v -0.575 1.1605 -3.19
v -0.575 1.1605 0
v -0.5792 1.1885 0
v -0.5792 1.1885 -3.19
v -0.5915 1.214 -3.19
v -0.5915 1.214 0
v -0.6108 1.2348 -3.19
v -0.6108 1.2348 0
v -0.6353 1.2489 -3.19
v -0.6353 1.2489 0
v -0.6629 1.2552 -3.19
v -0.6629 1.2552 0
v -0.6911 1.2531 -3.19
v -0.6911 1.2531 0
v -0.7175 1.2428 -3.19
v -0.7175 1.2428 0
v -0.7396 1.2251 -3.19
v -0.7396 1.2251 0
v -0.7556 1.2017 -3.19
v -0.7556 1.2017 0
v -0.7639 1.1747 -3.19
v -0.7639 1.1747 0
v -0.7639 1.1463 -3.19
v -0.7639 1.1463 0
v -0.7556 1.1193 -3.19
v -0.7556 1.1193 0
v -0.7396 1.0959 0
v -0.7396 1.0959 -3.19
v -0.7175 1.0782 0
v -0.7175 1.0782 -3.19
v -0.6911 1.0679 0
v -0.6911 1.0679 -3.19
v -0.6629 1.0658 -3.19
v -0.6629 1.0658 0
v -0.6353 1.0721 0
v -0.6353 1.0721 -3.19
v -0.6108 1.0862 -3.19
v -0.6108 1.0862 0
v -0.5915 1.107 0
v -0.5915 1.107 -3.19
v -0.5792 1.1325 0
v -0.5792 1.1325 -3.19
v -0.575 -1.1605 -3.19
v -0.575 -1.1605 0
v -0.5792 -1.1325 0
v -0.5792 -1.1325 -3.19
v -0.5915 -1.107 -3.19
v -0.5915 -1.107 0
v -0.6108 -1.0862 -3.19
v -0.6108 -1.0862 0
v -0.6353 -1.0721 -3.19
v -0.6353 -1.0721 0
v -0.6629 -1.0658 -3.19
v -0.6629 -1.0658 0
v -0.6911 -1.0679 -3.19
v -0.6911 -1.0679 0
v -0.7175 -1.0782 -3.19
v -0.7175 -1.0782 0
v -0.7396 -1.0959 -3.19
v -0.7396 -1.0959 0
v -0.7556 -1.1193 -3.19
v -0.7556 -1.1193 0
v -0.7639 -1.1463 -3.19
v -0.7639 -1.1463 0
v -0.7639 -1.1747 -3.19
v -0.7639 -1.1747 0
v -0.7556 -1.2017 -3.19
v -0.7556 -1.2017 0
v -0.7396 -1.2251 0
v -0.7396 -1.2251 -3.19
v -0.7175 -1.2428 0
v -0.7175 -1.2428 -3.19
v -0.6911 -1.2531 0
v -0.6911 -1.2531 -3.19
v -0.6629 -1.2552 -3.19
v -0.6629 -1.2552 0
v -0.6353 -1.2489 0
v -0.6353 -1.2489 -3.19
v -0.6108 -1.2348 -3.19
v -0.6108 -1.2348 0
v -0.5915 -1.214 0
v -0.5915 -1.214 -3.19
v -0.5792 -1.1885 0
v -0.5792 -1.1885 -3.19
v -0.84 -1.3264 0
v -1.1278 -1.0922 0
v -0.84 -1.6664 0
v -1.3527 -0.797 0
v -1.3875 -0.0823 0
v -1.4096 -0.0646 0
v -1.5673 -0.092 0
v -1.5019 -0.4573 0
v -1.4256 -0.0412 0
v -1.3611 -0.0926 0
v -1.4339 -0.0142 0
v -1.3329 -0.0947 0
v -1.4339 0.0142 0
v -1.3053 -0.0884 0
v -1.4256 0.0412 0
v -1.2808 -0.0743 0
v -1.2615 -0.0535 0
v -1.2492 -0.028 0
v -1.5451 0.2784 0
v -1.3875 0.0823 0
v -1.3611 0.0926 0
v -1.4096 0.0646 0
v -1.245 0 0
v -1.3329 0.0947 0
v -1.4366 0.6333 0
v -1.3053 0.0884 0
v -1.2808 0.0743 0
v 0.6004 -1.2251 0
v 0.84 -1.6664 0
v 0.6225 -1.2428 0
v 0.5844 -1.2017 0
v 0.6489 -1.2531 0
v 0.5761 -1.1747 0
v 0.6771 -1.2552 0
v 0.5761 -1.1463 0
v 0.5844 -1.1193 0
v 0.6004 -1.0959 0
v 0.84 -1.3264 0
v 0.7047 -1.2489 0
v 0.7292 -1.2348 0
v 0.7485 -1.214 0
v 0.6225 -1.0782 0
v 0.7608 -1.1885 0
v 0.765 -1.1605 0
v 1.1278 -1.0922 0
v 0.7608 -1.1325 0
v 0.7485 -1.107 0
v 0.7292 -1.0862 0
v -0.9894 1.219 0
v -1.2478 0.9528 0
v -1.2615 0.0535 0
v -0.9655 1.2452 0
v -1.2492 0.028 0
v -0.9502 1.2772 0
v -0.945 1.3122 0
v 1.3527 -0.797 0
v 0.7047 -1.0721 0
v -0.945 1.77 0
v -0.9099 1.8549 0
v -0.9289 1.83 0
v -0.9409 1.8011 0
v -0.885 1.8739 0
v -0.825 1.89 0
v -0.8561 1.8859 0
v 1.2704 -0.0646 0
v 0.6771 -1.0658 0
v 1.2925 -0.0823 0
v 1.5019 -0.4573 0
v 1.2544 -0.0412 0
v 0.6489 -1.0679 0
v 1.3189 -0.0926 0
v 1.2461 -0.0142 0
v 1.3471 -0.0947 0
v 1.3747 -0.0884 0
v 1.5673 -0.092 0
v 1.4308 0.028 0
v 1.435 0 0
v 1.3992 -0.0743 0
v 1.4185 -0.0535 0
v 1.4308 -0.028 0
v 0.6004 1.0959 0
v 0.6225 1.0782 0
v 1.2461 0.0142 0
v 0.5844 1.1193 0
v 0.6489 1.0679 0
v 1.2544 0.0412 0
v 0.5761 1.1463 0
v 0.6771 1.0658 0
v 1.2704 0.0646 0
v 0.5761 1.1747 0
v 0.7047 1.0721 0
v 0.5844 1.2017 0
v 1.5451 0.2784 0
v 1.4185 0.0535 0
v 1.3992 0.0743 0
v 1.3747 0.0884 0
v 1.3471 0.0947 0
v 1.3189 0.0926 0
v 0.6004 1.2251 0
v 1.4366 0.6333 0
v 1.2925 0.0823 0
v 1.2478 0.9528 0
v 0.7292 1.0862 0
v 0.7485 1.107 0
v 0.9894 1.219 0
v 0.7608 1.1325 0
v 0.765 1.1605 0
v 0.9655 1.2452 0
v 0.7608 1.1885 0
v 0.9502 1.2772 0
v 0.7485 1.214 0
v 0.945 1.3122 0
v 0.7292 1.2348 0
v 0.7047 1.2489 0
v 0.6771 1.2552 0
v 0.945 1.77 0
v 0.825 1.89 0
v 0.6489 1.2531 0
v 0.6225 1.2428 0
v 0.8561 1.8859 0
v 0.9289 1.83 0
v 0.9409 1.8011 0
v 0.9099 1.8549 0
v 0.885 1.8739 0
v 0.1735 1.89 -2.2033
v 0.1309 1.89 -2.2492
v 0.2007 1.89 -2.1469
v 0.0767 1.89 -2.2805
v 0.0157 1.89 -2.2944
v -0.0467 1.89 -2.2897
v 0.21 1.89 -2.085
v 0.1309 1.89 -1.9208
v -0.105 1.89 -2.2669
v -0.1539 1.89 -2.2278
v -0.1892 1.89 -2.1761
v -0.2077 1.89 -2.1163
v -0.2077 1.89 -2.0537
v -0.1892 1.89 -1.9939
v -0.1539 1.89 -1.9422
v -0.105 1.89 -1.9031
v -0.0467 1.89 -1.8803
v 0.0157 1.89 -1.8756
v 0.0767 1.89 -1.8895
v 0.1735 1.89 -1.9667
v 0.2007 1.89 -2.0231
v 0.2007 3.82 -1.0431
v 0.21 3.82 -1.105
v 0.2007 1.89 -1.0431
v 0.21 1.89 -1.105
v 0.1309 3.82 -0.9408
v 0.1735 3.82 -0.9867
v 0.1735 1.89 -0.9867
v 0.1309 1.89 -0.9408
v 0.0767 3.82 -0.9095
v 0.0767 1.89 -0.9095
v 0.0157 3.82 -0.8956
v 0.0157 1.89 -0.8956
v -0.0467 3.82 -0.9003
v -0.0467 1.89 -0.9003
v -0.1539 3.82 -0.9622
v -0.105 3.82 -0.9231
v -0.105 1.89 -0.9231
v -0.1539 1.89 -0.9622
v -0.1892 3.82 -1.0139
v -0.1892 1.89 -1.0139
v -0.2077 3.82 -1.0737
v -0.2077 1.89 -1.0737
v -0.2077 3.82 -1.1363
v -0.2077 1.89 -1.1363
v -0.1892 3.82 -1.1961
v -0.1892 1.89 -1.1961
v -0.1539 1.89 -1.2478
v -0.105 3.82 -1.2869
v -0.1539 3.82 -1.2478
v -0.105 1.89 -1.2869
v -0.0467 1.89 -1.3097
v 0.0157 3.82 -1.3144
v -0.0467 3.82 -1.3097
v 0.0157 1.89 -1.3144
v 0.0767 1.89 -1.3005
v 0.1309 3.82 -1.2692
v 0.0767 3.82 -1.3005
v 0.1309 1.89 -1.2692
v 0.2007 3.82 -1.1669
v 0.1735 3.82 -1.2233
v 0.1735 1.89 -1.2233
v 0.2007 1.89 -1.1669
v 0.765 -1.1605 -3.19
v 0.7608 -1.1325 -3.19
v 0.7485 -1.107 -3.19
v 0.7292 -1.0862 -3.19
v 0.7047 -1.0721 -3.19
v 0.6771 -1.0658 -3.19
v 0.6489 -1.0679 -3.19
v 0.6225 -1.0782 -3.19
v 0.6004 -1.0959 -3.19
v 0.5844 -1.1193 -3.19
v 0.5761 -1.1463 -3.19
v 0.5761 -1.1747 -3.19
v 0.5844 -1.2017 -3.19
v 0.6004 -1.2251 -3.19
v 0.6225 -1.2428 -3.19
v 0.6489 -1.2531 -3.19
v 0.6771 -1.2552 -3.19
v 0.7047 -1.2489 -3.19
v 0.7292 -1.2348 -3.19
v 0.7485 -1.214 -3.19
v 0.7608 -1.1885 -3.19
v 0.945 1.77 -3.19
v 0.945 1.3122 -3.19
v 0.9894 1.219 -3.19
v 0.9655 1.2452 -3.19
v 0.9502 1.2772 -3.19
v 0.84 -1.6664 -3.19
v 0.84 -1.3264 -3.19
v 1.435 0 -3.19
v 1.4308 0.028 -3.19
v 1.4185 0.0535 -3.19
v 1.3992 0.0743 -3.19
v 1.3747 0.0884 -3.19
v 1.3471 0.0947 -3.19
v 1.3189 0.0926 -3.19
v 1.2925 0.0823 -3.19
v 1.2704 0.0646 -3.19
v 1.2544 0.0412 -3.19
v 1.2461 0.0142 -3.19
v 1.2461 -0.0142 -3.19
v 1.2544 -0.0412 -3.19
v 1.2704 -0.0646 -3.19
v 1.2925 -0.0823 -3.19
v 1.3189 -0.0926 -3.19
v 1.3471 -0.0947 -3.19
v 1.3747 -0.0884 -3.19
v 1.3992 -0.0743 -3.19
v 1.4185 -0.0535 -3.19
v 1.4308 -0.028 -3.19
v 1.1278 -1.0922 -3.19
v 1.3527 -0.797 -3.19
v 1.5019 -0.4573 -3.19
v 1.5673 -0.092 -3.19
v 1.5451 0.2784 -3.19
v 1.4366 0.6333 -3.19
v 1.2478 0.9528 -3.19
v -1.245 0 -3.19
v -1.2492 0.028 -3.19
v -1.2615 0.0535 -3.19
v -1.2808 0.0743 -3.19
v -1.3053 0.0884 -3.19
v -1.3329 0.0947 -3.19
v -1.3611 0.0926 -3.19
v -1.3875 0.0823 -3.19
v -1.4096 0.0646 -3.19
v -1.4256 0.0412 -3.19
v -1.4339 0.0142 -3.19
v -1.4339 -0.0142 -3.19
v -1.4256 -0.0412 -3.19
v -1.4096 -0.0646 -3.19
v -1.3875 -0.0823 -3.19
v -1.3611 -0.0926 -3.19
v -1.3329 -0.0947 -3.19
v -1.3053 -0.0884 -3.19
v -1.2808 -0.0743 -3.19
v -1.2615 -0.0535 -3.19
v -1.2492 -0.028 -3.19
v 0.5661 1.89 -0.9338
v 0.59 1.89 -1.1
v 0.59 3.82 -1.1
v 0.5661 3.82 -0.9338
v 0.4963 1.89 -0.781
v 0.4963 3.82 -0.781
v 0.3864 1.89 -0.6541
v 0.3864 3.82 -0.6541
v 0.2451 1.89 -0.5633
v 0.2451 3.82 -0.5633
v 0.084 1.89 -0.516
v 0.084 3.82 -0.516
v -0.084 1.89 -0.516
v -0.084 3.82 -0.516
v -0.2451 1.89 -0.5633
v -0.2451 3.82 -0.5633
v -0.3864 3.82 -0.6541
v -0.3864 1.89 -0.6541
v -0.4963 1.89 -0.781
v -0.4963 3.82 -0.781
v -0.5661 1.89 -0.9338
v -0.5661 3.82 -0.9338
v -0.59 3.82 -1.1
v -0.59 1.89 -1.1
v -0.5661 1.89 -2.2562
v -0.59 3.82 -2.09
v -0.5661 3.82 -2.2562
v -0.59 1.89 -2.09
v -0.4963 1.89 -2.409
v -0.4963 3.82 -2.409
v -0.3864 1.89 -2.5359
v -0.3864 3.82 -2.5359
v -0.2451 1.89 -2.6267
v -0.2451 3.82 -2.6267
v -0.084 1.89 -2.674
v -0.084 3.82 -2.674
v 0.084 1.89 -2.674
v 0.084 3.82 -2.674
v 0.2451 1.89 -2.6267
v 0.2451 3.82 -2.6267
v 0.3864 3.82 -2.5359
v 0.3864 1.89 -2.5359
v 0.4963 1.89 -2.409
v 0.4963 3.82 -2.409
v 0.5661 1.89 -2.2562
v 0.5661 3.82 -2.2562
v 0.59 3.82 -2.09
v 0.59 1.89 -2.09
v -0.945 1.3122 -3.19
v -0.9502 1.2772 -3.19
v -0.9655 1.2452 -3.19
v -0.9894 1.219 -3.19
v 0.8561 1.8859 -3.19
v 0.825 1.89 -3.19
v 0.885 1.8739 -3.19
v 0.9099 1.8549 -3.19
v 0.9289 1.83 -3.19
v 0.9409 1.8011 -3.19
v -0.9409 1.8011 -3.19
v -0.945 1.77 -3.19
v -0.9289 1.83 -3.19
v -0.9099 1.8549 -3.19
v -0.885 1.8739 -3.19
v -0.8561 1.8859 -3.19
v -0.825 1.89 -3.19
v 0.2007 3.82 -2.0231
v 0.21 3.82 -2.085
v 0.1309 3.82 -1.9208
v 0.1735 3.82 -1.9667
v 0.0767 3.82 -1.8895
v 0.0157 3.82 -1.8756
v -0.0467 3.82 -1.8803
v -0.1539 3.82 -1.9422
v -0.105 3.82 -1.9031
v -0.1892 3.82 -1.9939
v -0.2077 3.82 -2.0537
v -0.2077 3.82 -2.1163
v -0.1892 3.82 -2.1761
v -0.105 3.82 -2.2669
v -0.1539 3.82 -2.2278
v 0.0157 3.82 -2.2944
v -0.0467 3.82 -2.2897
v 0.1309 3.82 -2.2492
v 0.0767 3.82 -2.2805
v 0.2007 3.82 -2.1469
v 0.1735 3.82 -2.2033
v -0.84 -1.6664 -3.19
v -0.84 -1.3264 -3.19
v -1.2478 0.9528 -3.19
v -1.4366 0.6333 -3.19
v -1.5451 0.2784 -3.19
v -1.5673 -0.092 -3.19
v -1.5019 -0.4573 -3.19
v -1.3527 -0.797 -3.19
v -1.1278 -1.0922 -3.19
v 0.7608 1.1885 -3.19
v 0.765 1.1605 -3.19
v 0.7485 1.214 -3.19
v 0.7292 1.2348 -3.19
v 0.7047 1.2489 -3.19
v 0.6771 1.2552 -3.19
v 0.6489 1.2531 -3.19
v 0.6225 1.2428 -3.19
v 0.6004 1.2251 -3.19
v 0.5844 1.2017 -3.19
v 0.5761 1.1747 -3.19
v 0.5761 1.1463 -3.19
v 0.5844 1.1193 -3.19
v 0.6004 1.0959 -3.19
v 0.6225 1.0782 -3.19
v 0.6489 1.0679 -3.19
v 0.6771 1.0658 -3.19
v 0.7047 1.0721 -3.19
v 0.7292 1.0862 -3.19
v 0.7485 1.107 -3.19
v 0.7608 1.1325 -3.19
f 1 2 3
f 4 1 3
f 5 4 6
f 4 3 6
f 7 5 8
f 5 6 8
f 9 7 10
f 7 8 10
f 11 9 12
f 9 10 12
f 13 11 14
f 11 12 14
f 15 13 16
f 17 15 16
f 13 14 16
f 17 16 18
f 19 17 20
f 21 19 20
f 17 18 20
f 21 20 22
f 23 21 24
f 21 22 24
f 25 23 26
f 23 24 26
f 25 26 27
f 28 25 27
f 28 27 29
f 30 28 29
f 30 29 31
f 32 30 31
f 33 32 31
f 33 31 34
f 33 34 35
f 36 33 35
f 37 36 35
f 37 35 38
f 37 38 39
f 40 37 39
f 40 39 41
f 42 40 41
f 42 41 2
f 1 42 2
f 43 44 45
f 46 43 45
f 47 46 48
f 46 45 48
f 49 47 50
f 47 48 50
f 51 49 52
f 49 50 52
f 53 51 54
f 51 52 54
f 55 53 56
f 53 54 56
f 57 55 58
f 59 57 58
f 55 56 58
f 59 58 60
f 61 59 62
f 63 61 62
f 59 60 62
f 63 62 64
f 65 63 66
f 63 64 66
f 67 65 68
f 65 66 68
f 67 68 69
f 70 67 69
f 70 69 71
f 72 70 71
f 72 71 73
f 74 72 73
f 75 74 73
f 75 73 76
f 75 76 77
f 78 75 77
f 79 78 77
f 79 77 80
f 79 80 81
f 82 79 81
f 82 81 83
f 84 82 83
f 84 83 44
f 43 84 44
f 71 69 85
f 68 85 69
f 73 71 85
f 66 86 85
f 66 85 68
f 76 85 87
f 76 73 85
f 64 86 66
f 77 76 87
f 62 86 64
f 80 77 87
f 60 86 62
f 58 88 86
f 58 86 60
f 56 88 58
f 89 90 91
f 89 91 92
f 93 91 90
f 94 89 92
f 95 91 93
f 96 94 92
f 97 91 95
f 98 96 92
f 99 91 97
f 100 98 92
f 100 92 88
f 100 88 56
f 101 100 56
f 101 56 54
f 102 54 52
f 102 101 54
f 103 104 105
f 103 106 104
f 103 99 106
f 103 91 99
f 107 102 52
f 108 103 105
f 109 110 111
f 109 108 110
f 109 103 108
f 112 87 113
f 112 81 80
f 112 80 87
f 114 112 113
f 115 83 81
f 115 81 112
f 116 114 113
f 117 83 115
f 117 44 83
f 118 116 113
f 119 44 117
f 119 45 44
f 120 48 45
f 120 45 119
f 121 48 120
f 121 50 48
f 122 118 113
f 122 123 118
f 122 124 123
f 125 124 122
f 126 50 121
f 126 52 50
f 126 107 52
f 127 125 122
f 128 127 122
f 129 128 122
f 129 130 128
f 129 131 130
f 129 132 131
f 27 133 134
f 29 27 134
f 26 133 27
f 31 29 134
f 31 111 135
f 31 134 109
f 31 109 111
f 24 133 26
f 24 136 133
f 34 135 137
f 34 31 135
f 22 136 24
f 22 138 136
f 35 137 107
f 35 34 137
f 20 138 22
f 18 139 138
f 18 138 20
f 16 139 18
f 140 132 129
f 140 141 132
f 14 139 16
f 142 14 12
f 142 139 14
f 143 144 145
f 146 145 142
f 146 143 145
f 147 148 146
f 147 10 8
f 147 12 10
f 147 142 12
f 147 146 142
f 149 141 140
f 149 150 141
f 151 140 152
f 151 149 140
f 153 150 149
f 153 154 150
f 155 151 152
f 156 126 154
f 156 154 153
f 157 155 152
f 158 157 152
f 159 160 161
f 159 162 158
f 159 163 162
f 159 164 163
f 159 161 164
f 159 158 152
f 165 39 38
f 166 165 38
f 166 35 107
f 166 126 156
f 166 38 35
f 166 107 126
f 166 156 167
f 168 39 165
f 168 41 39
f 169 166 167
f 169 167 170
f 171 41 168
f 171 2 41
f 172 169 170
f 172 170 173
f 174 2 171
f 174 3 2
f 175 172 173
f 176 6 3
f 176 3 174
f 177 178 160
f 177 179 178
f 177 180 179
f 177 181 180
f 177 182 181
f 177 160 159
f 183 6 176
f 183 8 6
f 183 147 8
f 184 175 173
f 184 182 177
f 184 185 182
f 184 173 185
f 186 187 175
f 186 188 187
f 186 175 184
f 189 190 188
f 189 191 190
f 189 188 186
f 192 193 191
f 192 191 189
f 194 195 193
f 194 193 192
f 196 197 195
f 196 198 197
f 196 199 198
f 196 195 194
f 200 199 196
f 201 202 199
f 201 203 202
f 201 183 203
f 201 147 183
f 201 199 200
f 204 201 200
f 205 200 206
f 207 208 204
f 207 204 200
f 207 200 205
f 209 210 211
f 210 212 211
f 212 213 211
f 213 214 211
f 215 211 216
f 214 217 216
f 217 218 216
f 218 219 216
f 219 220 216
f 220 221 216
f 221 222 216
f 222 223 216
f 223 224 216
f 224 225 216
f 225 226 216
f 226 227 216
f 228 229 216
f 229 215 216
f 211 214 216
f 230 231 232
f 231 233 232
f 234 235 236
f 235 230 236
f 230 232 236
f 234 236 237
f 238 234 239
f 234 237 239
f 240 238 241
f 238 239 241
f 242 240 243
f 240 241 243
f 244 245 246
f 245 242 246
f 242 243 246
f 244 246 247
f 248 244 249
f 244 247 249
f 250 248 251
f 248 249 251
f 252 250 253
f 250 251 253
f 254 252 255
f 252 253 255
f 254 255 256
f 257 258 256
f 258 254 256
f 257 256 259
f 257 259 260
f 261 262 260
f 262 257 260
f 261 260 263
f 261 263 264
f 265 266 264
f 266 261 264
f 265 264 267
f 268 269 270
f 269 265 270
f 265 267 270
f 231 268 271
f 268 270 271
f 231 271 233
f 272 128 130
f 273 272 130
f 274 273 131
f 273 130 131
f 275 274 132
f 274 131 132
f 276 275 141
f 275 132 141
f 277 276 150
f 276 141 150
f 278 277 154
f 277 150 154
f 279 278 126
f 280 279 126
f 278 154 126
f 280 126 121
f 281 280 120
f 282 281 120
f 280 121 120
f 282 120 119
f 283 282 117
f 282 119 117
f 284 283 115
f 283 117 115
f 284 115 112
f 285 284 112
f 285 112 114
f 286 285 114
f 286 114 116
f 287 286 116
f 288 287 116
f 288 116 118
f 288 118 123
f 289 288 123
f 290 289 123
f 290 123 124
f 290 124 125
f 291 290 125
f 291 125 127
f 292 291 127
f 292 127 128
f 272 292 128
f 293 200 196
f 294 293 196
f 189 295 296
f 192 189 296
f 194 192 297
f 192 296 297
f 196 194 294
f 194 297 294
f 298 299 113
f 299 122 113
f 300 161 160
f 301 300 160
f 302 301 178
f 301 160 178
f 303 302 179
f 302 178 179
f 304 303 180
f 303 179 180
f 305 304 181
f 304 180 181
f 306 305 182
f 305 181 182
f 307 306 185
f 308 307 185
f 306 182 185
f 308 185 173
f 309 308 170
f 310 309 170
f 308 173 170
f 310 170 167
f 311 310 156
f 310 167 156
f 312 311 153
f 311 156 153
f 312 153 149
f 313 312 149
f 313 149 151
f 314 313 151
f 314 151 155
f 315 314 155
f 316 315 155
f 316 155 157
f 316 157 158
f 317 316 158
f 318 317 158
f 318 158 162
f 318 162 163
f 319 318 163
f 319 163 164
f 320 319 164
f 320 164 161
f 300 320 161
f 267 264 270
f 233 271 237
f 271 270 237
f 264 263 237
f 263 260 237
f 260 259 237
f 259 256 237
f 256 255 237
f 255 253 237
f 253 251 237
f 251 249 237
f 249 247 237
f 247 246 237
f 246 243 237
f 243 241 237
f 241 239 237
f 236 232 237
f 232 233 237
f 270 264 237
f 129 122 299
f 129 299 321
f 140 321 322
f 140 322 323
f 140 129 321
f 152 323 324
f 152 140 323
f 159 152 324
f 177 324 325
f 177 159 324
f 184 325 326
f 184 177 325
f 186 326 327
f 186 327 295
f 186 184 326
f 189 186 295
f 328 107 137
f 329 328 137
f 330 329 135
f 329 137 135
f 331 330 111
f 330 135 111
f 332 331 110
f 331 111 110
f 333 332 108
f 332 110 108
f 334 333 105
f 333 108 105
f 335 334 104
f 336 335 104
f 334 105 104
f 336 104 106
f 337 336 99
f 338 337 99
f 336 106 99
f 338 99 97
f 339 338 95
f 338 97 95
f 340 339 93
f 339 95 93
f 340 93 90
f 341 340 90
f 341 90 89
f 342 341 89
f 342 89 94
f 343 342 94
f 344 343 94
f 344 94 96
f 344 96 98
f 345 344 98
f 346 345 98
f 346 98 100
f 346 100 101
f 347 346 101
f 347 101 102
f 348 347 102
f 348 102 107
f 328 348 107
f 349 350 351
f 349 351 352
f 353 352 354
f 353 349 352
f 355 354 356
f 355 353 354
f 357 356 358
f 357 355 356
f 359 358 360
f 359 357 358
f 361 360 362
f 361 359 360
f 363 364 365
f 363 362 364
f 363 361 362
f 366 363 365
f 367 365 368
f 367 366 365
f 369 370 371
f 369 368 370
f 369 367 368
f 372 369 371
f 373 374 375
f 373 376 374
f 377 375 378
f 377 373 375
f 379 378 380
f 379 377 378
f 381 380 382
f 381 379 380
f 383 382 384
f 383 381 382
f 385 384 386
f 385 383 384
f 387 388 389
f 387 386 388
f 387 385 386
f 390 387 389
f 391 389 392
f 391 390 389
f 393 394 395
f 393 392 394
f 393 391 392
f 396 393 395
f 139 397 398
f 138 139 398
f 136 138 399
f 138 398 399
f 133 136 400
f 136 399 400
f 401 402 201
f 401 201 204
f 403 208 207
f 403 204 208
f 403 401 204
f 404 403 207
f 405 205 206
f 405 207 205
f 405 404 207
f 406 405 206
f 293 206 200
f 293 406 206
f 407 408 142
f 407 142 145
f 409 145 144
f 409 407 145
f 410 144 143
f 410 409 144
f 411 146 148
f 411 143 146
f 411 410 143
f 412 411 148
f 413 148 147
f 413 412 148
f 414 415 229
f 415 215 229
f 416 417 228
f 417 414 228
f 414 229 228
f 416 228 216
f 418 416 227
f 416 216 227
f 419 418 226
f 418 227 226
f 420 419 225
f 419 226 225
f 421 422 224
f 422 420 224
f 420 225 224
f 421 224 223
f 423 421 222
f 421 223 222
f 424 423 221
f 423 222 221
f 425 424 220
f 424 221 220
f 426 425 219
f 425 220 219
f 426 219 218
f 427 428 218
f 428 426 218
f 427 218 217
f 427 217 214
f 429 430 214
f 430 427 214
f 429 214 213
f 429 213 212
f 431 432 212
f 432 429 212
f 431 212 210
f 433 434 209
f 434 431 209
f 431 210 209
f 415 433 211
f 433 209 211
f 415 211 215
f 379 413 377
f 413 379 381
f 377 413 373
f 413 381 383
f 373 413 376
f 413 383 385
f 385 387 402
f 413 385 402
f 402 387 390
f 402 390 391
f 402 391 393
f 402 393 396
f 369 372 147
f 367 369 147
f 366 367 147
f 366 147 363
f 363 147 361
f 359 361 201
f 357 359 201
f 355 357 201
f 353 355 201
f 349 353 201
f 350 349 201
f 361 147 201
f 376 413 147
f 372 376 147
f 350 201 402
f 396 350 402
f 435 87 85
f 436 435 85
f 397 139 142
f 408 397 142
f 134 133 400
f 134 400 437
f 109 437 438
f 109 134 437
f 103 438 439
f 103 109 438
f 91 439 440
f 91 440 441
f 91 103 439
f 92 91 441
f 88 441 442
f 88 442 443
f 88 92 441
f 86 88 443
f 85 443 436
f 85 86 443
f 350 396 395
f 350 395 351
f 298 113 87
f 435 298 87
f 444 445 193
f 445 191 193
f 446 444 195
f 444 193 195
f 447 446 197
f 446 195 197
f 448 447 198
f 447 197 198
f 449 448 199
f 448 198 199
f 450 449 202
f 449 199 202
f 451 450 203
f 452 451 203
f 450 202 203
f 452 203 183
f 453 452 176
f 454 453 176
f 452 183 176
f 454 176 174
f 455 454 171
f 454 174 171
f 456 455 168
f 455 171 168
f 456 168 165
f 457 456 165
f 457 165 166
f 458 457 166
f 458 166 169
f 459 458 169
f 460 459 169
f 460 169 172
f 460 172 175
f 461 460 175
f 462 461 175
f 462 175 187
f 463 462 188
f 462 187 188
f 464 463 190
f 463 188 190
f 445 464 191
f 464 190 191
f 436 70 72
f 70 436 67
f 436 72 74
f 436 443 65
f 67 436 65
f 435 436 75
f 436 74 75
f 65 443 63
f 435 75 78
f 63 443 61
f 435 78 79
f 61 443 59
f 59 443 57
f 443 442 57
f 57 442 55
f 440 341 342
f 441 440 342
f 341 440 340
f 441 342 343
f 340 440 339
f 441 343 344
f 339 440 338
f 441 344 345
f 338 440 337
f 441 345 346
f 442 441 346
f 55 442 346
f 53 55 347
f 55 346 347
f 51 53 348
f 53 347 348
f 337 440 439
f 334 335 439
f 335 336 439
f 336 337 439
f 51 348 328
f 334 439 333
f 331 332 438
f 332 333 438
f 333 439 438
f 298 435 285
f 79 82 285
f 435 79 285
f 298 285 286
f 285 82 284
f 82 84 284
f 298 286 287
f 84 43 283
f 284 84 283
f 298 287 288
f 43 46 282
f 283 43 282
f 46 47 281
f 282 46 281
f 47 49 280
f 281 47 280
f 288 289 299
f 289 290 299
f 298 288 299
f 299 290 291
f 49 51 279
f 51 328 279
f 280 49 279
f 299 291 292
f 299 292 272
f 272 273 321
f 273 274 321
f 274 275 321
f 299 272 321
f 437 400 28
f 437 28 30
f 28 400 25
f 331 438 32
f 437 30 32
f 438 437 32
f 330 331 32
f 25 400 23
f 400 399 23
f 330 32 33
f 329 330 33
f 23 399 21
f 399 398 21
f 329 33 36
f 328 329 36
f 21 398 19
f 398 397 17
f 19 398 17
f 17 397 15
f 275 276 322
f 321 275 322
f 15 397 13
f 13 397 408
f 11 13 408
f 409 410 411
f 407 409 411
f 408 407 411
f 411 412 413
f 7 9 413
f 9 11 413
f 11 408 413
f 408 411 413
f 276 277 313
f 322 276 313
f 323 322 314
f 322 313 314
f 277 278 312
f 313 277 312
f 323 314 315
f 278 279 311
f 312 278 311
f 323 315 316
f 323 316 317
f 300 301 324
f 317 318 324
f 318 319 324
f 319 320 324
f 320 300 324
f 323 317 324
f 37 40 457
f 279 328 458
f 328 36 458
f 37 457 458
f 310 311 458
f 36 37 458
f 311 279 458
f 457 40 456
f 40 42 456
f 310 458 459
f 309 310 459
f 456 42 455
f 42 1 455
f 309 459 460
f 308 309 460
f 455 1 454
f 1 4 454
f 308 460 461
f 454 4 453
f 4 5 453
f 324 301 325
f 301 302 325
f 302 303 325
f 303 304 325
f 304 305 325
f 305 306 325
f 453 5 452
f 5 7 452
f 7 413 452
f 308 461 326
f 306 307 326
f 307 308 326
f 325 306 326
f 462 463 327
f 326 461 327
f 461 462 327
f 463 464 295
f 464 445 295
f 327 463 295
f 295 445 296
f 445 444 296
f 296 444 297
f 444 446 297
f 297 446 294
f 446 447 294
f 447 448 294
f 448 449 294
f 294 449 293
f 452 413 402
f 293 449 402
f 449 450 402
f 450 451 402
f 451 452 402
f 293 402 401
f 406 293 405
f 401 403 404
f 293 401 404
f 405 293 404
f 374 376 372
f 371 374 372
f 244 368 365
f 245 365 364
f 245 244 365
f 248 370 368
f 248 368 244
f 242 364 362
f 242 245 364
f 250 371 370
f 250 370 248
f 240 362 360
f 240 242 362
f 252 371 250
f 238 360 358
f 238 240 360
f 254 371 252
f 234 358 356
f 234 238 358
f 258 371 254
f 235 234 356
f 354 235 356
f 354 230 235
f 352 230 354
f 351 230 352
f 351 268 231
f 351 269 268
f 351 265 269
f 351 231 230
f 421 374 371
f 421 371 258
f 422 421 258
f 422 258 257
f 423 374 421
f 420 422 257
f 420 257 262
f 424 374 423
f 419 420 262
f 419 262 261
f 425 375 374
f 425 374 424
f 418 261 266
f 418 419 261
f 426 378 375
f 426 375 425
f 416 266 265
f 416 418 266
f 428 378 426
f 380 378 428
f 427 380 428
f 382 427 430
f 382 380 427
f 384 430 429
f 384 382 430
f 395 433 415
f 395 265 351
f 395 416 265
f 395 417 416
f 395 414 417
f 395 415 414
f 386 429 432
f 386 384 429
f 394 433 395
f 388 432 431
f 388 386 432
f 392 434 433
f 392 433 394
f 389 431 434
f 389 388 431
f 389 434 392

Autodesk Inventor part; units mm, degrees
ref_plane "YZ Plane" through (0, 0, 0) normal (1, 0, 0) x (0, 1, 0)
ref_plane "XZ Plane" through (0, 0, 0) normal (0, 1, 0) x (-1, 0, 0)
ref_plane "XY Plane" through (0, 0, 0) normal (0, 0, 1) x (1, 0, 0)
sketch "Boceto1" plane through (0, 0, 0) normal (0, 0, 1) x (1, 0, 0)
  circle A0 centre (0, 0) radius 1.57
  line L0 (0, 0) -> (1.34, 0) construction
  line L1 (0, 0) -> (-1.34, 0) construction
  circle A1 centre (-1.34, 0) radius 0.095
  circle A2 centre (-0.67, 1.1605) radius 0.095
  circle A3 centre (0, 0) radius 1.57
  circle A4 centre (0.67, 1.1605) radius 0.095
  circle A5 centre (0, 0) radius 1.57
  circle A6 centre (1.34, 0) radius 0.095
  circle A7 centre (0, 0) radius 1.57
  circle A8 centre (0.67, -1.1605) radius 0.095
  circle A9 centre (0, 0) radius 1.57
  circle A10 centre (-0.67, -1.1605) radius 0.095
  circle A11 centre (0, 0) radius 1.57
  line L2 (-0.67, 1.1605) -> (0.67, 1.1605) construction
  line L3 (0, 0) -> (-0.67, 1.1605) construction
  circle A12 centre (0, 0) radius 1.17
  line L4 (-0.945, 1.2537) -> (-0.945, 1.89)
  line L5 (-0.945, 1.89) -> (0.945, 1.89)
  line L6 (0.945, 1.89) -> (0.945, 1.2537)
  line L7 (0, 2.3163) -> (0, 0) construction
  line L8 (0.84, -1.3264) -> (0.84, -1.6664)
  line L9 (0.84, -1.6664) -> (-0.84, -1.6664)
  line L10 (-0.84, -1.6664) -> (-0.84, -1.3264)
  point P0 (0, 1.89)
  dimension "d0" = 3.14
  dimension "d4" = 0.19
  dimension "d7" = 360
  dimension "d9" = 1.34
  dimension "d10" = 1.34
  dimension "d11" = 2.34
  dimension "d12" = 1.89
  dimension "d13" = 1.89
  dimension "d34" = 0.34
  dimension "d35" = 0.34
  dimension "d36" = 0.84
extrude "Extrusión1" add sketch "Boceto1" against normal blind 3.19 contours A0 | A0 L4 L5 L6 | L8 L9 L10 A0 | A12
fillet "Empalme1" radius 0.12 4 edges at (0.945, 1.2537, -1.595) (0.945, 1.89, -1.595) (-0.945, 1.2537, -1.595) (-0.945, 1.89, -1.595)
sketch "Boceto2" plane through (-0.825, 1.89, 0) normal (0, 1, 0) x (1, 0, 0)
  line L0 (0, 0) -> (0, 3.19) construction
  line L1 (1.65, 0) -> (0, 0) construction
  line L2 (1.65, 3.19) -> (1.65, 0) construction
  line L3 (0, 3.19) -> (1.65, 3.19) construction
  line L4 (0.06, 3.19) -> (0.06, 0) construction
  line L5 (0.06, 1.595) -> (1.65, 1.595) construction
  line L6 (1.65, 3.19) -> (1.65, 0) construction
  line L7 (0.825, 2.68) -> (0.825, 0.51) construction
  line L8 (0.825, 0) -> (0.825, 3.1487) construction
  line L9 (-0.015, 3.19) -> (-0.745, 3.19) construction
  line L10 (0.235, 2.09) -> (0.235, 1.1)
  line L11 (1.415, 2.09) -> (1.415, 1.1)
  circle A0 centre (0.825, 2.085) radius 0.21
  circle A1 centre (0.825, 1.105) radius 0.21
  arc A2 (1.415, 2.09) -> (0.235, 2.09) centre (0.825, 2.09) ccw
  arc A3 (0.235, 1.1) -> (1.415, 1.1) centre (0.825, 1.1) ccw
  point P0 (1.8144, 3.19)
  point P1 (-0.1644, 3.19)
  point P2 (0.825, 1.595)
  point P3 (0.825, 1.5744)
  point P4 (0.5472, 0.7661)
  dimension "d17" = 2.17
  dimension "d18" = 1.085
  dimension "d22" = 0.42
  dimension "d23" = 0.42
  dimension "d24" = 0.98
  dimension "d25" = 0.49
  dimension "d26" = 0.59
  dimension "d27" = 0.59
  dimension "d38" = 180
extrude "Extrusión2" add sketch "Boceto2" along normal blind 1.93
sketch "Boceto3" plane through (0, 0, 0) normal (0, 0, 1) x (1, 0, 0)
  circle A0 centre (0, 0) radius 1.025
  dimension "d31" = 2.05
sketch "Boceto7" plane through (-0.84, -1.6664, 0) normal (0, -1, 0) x (1, 0, 0)
  point P0 (0.84, 0)
properties part number "examen"
